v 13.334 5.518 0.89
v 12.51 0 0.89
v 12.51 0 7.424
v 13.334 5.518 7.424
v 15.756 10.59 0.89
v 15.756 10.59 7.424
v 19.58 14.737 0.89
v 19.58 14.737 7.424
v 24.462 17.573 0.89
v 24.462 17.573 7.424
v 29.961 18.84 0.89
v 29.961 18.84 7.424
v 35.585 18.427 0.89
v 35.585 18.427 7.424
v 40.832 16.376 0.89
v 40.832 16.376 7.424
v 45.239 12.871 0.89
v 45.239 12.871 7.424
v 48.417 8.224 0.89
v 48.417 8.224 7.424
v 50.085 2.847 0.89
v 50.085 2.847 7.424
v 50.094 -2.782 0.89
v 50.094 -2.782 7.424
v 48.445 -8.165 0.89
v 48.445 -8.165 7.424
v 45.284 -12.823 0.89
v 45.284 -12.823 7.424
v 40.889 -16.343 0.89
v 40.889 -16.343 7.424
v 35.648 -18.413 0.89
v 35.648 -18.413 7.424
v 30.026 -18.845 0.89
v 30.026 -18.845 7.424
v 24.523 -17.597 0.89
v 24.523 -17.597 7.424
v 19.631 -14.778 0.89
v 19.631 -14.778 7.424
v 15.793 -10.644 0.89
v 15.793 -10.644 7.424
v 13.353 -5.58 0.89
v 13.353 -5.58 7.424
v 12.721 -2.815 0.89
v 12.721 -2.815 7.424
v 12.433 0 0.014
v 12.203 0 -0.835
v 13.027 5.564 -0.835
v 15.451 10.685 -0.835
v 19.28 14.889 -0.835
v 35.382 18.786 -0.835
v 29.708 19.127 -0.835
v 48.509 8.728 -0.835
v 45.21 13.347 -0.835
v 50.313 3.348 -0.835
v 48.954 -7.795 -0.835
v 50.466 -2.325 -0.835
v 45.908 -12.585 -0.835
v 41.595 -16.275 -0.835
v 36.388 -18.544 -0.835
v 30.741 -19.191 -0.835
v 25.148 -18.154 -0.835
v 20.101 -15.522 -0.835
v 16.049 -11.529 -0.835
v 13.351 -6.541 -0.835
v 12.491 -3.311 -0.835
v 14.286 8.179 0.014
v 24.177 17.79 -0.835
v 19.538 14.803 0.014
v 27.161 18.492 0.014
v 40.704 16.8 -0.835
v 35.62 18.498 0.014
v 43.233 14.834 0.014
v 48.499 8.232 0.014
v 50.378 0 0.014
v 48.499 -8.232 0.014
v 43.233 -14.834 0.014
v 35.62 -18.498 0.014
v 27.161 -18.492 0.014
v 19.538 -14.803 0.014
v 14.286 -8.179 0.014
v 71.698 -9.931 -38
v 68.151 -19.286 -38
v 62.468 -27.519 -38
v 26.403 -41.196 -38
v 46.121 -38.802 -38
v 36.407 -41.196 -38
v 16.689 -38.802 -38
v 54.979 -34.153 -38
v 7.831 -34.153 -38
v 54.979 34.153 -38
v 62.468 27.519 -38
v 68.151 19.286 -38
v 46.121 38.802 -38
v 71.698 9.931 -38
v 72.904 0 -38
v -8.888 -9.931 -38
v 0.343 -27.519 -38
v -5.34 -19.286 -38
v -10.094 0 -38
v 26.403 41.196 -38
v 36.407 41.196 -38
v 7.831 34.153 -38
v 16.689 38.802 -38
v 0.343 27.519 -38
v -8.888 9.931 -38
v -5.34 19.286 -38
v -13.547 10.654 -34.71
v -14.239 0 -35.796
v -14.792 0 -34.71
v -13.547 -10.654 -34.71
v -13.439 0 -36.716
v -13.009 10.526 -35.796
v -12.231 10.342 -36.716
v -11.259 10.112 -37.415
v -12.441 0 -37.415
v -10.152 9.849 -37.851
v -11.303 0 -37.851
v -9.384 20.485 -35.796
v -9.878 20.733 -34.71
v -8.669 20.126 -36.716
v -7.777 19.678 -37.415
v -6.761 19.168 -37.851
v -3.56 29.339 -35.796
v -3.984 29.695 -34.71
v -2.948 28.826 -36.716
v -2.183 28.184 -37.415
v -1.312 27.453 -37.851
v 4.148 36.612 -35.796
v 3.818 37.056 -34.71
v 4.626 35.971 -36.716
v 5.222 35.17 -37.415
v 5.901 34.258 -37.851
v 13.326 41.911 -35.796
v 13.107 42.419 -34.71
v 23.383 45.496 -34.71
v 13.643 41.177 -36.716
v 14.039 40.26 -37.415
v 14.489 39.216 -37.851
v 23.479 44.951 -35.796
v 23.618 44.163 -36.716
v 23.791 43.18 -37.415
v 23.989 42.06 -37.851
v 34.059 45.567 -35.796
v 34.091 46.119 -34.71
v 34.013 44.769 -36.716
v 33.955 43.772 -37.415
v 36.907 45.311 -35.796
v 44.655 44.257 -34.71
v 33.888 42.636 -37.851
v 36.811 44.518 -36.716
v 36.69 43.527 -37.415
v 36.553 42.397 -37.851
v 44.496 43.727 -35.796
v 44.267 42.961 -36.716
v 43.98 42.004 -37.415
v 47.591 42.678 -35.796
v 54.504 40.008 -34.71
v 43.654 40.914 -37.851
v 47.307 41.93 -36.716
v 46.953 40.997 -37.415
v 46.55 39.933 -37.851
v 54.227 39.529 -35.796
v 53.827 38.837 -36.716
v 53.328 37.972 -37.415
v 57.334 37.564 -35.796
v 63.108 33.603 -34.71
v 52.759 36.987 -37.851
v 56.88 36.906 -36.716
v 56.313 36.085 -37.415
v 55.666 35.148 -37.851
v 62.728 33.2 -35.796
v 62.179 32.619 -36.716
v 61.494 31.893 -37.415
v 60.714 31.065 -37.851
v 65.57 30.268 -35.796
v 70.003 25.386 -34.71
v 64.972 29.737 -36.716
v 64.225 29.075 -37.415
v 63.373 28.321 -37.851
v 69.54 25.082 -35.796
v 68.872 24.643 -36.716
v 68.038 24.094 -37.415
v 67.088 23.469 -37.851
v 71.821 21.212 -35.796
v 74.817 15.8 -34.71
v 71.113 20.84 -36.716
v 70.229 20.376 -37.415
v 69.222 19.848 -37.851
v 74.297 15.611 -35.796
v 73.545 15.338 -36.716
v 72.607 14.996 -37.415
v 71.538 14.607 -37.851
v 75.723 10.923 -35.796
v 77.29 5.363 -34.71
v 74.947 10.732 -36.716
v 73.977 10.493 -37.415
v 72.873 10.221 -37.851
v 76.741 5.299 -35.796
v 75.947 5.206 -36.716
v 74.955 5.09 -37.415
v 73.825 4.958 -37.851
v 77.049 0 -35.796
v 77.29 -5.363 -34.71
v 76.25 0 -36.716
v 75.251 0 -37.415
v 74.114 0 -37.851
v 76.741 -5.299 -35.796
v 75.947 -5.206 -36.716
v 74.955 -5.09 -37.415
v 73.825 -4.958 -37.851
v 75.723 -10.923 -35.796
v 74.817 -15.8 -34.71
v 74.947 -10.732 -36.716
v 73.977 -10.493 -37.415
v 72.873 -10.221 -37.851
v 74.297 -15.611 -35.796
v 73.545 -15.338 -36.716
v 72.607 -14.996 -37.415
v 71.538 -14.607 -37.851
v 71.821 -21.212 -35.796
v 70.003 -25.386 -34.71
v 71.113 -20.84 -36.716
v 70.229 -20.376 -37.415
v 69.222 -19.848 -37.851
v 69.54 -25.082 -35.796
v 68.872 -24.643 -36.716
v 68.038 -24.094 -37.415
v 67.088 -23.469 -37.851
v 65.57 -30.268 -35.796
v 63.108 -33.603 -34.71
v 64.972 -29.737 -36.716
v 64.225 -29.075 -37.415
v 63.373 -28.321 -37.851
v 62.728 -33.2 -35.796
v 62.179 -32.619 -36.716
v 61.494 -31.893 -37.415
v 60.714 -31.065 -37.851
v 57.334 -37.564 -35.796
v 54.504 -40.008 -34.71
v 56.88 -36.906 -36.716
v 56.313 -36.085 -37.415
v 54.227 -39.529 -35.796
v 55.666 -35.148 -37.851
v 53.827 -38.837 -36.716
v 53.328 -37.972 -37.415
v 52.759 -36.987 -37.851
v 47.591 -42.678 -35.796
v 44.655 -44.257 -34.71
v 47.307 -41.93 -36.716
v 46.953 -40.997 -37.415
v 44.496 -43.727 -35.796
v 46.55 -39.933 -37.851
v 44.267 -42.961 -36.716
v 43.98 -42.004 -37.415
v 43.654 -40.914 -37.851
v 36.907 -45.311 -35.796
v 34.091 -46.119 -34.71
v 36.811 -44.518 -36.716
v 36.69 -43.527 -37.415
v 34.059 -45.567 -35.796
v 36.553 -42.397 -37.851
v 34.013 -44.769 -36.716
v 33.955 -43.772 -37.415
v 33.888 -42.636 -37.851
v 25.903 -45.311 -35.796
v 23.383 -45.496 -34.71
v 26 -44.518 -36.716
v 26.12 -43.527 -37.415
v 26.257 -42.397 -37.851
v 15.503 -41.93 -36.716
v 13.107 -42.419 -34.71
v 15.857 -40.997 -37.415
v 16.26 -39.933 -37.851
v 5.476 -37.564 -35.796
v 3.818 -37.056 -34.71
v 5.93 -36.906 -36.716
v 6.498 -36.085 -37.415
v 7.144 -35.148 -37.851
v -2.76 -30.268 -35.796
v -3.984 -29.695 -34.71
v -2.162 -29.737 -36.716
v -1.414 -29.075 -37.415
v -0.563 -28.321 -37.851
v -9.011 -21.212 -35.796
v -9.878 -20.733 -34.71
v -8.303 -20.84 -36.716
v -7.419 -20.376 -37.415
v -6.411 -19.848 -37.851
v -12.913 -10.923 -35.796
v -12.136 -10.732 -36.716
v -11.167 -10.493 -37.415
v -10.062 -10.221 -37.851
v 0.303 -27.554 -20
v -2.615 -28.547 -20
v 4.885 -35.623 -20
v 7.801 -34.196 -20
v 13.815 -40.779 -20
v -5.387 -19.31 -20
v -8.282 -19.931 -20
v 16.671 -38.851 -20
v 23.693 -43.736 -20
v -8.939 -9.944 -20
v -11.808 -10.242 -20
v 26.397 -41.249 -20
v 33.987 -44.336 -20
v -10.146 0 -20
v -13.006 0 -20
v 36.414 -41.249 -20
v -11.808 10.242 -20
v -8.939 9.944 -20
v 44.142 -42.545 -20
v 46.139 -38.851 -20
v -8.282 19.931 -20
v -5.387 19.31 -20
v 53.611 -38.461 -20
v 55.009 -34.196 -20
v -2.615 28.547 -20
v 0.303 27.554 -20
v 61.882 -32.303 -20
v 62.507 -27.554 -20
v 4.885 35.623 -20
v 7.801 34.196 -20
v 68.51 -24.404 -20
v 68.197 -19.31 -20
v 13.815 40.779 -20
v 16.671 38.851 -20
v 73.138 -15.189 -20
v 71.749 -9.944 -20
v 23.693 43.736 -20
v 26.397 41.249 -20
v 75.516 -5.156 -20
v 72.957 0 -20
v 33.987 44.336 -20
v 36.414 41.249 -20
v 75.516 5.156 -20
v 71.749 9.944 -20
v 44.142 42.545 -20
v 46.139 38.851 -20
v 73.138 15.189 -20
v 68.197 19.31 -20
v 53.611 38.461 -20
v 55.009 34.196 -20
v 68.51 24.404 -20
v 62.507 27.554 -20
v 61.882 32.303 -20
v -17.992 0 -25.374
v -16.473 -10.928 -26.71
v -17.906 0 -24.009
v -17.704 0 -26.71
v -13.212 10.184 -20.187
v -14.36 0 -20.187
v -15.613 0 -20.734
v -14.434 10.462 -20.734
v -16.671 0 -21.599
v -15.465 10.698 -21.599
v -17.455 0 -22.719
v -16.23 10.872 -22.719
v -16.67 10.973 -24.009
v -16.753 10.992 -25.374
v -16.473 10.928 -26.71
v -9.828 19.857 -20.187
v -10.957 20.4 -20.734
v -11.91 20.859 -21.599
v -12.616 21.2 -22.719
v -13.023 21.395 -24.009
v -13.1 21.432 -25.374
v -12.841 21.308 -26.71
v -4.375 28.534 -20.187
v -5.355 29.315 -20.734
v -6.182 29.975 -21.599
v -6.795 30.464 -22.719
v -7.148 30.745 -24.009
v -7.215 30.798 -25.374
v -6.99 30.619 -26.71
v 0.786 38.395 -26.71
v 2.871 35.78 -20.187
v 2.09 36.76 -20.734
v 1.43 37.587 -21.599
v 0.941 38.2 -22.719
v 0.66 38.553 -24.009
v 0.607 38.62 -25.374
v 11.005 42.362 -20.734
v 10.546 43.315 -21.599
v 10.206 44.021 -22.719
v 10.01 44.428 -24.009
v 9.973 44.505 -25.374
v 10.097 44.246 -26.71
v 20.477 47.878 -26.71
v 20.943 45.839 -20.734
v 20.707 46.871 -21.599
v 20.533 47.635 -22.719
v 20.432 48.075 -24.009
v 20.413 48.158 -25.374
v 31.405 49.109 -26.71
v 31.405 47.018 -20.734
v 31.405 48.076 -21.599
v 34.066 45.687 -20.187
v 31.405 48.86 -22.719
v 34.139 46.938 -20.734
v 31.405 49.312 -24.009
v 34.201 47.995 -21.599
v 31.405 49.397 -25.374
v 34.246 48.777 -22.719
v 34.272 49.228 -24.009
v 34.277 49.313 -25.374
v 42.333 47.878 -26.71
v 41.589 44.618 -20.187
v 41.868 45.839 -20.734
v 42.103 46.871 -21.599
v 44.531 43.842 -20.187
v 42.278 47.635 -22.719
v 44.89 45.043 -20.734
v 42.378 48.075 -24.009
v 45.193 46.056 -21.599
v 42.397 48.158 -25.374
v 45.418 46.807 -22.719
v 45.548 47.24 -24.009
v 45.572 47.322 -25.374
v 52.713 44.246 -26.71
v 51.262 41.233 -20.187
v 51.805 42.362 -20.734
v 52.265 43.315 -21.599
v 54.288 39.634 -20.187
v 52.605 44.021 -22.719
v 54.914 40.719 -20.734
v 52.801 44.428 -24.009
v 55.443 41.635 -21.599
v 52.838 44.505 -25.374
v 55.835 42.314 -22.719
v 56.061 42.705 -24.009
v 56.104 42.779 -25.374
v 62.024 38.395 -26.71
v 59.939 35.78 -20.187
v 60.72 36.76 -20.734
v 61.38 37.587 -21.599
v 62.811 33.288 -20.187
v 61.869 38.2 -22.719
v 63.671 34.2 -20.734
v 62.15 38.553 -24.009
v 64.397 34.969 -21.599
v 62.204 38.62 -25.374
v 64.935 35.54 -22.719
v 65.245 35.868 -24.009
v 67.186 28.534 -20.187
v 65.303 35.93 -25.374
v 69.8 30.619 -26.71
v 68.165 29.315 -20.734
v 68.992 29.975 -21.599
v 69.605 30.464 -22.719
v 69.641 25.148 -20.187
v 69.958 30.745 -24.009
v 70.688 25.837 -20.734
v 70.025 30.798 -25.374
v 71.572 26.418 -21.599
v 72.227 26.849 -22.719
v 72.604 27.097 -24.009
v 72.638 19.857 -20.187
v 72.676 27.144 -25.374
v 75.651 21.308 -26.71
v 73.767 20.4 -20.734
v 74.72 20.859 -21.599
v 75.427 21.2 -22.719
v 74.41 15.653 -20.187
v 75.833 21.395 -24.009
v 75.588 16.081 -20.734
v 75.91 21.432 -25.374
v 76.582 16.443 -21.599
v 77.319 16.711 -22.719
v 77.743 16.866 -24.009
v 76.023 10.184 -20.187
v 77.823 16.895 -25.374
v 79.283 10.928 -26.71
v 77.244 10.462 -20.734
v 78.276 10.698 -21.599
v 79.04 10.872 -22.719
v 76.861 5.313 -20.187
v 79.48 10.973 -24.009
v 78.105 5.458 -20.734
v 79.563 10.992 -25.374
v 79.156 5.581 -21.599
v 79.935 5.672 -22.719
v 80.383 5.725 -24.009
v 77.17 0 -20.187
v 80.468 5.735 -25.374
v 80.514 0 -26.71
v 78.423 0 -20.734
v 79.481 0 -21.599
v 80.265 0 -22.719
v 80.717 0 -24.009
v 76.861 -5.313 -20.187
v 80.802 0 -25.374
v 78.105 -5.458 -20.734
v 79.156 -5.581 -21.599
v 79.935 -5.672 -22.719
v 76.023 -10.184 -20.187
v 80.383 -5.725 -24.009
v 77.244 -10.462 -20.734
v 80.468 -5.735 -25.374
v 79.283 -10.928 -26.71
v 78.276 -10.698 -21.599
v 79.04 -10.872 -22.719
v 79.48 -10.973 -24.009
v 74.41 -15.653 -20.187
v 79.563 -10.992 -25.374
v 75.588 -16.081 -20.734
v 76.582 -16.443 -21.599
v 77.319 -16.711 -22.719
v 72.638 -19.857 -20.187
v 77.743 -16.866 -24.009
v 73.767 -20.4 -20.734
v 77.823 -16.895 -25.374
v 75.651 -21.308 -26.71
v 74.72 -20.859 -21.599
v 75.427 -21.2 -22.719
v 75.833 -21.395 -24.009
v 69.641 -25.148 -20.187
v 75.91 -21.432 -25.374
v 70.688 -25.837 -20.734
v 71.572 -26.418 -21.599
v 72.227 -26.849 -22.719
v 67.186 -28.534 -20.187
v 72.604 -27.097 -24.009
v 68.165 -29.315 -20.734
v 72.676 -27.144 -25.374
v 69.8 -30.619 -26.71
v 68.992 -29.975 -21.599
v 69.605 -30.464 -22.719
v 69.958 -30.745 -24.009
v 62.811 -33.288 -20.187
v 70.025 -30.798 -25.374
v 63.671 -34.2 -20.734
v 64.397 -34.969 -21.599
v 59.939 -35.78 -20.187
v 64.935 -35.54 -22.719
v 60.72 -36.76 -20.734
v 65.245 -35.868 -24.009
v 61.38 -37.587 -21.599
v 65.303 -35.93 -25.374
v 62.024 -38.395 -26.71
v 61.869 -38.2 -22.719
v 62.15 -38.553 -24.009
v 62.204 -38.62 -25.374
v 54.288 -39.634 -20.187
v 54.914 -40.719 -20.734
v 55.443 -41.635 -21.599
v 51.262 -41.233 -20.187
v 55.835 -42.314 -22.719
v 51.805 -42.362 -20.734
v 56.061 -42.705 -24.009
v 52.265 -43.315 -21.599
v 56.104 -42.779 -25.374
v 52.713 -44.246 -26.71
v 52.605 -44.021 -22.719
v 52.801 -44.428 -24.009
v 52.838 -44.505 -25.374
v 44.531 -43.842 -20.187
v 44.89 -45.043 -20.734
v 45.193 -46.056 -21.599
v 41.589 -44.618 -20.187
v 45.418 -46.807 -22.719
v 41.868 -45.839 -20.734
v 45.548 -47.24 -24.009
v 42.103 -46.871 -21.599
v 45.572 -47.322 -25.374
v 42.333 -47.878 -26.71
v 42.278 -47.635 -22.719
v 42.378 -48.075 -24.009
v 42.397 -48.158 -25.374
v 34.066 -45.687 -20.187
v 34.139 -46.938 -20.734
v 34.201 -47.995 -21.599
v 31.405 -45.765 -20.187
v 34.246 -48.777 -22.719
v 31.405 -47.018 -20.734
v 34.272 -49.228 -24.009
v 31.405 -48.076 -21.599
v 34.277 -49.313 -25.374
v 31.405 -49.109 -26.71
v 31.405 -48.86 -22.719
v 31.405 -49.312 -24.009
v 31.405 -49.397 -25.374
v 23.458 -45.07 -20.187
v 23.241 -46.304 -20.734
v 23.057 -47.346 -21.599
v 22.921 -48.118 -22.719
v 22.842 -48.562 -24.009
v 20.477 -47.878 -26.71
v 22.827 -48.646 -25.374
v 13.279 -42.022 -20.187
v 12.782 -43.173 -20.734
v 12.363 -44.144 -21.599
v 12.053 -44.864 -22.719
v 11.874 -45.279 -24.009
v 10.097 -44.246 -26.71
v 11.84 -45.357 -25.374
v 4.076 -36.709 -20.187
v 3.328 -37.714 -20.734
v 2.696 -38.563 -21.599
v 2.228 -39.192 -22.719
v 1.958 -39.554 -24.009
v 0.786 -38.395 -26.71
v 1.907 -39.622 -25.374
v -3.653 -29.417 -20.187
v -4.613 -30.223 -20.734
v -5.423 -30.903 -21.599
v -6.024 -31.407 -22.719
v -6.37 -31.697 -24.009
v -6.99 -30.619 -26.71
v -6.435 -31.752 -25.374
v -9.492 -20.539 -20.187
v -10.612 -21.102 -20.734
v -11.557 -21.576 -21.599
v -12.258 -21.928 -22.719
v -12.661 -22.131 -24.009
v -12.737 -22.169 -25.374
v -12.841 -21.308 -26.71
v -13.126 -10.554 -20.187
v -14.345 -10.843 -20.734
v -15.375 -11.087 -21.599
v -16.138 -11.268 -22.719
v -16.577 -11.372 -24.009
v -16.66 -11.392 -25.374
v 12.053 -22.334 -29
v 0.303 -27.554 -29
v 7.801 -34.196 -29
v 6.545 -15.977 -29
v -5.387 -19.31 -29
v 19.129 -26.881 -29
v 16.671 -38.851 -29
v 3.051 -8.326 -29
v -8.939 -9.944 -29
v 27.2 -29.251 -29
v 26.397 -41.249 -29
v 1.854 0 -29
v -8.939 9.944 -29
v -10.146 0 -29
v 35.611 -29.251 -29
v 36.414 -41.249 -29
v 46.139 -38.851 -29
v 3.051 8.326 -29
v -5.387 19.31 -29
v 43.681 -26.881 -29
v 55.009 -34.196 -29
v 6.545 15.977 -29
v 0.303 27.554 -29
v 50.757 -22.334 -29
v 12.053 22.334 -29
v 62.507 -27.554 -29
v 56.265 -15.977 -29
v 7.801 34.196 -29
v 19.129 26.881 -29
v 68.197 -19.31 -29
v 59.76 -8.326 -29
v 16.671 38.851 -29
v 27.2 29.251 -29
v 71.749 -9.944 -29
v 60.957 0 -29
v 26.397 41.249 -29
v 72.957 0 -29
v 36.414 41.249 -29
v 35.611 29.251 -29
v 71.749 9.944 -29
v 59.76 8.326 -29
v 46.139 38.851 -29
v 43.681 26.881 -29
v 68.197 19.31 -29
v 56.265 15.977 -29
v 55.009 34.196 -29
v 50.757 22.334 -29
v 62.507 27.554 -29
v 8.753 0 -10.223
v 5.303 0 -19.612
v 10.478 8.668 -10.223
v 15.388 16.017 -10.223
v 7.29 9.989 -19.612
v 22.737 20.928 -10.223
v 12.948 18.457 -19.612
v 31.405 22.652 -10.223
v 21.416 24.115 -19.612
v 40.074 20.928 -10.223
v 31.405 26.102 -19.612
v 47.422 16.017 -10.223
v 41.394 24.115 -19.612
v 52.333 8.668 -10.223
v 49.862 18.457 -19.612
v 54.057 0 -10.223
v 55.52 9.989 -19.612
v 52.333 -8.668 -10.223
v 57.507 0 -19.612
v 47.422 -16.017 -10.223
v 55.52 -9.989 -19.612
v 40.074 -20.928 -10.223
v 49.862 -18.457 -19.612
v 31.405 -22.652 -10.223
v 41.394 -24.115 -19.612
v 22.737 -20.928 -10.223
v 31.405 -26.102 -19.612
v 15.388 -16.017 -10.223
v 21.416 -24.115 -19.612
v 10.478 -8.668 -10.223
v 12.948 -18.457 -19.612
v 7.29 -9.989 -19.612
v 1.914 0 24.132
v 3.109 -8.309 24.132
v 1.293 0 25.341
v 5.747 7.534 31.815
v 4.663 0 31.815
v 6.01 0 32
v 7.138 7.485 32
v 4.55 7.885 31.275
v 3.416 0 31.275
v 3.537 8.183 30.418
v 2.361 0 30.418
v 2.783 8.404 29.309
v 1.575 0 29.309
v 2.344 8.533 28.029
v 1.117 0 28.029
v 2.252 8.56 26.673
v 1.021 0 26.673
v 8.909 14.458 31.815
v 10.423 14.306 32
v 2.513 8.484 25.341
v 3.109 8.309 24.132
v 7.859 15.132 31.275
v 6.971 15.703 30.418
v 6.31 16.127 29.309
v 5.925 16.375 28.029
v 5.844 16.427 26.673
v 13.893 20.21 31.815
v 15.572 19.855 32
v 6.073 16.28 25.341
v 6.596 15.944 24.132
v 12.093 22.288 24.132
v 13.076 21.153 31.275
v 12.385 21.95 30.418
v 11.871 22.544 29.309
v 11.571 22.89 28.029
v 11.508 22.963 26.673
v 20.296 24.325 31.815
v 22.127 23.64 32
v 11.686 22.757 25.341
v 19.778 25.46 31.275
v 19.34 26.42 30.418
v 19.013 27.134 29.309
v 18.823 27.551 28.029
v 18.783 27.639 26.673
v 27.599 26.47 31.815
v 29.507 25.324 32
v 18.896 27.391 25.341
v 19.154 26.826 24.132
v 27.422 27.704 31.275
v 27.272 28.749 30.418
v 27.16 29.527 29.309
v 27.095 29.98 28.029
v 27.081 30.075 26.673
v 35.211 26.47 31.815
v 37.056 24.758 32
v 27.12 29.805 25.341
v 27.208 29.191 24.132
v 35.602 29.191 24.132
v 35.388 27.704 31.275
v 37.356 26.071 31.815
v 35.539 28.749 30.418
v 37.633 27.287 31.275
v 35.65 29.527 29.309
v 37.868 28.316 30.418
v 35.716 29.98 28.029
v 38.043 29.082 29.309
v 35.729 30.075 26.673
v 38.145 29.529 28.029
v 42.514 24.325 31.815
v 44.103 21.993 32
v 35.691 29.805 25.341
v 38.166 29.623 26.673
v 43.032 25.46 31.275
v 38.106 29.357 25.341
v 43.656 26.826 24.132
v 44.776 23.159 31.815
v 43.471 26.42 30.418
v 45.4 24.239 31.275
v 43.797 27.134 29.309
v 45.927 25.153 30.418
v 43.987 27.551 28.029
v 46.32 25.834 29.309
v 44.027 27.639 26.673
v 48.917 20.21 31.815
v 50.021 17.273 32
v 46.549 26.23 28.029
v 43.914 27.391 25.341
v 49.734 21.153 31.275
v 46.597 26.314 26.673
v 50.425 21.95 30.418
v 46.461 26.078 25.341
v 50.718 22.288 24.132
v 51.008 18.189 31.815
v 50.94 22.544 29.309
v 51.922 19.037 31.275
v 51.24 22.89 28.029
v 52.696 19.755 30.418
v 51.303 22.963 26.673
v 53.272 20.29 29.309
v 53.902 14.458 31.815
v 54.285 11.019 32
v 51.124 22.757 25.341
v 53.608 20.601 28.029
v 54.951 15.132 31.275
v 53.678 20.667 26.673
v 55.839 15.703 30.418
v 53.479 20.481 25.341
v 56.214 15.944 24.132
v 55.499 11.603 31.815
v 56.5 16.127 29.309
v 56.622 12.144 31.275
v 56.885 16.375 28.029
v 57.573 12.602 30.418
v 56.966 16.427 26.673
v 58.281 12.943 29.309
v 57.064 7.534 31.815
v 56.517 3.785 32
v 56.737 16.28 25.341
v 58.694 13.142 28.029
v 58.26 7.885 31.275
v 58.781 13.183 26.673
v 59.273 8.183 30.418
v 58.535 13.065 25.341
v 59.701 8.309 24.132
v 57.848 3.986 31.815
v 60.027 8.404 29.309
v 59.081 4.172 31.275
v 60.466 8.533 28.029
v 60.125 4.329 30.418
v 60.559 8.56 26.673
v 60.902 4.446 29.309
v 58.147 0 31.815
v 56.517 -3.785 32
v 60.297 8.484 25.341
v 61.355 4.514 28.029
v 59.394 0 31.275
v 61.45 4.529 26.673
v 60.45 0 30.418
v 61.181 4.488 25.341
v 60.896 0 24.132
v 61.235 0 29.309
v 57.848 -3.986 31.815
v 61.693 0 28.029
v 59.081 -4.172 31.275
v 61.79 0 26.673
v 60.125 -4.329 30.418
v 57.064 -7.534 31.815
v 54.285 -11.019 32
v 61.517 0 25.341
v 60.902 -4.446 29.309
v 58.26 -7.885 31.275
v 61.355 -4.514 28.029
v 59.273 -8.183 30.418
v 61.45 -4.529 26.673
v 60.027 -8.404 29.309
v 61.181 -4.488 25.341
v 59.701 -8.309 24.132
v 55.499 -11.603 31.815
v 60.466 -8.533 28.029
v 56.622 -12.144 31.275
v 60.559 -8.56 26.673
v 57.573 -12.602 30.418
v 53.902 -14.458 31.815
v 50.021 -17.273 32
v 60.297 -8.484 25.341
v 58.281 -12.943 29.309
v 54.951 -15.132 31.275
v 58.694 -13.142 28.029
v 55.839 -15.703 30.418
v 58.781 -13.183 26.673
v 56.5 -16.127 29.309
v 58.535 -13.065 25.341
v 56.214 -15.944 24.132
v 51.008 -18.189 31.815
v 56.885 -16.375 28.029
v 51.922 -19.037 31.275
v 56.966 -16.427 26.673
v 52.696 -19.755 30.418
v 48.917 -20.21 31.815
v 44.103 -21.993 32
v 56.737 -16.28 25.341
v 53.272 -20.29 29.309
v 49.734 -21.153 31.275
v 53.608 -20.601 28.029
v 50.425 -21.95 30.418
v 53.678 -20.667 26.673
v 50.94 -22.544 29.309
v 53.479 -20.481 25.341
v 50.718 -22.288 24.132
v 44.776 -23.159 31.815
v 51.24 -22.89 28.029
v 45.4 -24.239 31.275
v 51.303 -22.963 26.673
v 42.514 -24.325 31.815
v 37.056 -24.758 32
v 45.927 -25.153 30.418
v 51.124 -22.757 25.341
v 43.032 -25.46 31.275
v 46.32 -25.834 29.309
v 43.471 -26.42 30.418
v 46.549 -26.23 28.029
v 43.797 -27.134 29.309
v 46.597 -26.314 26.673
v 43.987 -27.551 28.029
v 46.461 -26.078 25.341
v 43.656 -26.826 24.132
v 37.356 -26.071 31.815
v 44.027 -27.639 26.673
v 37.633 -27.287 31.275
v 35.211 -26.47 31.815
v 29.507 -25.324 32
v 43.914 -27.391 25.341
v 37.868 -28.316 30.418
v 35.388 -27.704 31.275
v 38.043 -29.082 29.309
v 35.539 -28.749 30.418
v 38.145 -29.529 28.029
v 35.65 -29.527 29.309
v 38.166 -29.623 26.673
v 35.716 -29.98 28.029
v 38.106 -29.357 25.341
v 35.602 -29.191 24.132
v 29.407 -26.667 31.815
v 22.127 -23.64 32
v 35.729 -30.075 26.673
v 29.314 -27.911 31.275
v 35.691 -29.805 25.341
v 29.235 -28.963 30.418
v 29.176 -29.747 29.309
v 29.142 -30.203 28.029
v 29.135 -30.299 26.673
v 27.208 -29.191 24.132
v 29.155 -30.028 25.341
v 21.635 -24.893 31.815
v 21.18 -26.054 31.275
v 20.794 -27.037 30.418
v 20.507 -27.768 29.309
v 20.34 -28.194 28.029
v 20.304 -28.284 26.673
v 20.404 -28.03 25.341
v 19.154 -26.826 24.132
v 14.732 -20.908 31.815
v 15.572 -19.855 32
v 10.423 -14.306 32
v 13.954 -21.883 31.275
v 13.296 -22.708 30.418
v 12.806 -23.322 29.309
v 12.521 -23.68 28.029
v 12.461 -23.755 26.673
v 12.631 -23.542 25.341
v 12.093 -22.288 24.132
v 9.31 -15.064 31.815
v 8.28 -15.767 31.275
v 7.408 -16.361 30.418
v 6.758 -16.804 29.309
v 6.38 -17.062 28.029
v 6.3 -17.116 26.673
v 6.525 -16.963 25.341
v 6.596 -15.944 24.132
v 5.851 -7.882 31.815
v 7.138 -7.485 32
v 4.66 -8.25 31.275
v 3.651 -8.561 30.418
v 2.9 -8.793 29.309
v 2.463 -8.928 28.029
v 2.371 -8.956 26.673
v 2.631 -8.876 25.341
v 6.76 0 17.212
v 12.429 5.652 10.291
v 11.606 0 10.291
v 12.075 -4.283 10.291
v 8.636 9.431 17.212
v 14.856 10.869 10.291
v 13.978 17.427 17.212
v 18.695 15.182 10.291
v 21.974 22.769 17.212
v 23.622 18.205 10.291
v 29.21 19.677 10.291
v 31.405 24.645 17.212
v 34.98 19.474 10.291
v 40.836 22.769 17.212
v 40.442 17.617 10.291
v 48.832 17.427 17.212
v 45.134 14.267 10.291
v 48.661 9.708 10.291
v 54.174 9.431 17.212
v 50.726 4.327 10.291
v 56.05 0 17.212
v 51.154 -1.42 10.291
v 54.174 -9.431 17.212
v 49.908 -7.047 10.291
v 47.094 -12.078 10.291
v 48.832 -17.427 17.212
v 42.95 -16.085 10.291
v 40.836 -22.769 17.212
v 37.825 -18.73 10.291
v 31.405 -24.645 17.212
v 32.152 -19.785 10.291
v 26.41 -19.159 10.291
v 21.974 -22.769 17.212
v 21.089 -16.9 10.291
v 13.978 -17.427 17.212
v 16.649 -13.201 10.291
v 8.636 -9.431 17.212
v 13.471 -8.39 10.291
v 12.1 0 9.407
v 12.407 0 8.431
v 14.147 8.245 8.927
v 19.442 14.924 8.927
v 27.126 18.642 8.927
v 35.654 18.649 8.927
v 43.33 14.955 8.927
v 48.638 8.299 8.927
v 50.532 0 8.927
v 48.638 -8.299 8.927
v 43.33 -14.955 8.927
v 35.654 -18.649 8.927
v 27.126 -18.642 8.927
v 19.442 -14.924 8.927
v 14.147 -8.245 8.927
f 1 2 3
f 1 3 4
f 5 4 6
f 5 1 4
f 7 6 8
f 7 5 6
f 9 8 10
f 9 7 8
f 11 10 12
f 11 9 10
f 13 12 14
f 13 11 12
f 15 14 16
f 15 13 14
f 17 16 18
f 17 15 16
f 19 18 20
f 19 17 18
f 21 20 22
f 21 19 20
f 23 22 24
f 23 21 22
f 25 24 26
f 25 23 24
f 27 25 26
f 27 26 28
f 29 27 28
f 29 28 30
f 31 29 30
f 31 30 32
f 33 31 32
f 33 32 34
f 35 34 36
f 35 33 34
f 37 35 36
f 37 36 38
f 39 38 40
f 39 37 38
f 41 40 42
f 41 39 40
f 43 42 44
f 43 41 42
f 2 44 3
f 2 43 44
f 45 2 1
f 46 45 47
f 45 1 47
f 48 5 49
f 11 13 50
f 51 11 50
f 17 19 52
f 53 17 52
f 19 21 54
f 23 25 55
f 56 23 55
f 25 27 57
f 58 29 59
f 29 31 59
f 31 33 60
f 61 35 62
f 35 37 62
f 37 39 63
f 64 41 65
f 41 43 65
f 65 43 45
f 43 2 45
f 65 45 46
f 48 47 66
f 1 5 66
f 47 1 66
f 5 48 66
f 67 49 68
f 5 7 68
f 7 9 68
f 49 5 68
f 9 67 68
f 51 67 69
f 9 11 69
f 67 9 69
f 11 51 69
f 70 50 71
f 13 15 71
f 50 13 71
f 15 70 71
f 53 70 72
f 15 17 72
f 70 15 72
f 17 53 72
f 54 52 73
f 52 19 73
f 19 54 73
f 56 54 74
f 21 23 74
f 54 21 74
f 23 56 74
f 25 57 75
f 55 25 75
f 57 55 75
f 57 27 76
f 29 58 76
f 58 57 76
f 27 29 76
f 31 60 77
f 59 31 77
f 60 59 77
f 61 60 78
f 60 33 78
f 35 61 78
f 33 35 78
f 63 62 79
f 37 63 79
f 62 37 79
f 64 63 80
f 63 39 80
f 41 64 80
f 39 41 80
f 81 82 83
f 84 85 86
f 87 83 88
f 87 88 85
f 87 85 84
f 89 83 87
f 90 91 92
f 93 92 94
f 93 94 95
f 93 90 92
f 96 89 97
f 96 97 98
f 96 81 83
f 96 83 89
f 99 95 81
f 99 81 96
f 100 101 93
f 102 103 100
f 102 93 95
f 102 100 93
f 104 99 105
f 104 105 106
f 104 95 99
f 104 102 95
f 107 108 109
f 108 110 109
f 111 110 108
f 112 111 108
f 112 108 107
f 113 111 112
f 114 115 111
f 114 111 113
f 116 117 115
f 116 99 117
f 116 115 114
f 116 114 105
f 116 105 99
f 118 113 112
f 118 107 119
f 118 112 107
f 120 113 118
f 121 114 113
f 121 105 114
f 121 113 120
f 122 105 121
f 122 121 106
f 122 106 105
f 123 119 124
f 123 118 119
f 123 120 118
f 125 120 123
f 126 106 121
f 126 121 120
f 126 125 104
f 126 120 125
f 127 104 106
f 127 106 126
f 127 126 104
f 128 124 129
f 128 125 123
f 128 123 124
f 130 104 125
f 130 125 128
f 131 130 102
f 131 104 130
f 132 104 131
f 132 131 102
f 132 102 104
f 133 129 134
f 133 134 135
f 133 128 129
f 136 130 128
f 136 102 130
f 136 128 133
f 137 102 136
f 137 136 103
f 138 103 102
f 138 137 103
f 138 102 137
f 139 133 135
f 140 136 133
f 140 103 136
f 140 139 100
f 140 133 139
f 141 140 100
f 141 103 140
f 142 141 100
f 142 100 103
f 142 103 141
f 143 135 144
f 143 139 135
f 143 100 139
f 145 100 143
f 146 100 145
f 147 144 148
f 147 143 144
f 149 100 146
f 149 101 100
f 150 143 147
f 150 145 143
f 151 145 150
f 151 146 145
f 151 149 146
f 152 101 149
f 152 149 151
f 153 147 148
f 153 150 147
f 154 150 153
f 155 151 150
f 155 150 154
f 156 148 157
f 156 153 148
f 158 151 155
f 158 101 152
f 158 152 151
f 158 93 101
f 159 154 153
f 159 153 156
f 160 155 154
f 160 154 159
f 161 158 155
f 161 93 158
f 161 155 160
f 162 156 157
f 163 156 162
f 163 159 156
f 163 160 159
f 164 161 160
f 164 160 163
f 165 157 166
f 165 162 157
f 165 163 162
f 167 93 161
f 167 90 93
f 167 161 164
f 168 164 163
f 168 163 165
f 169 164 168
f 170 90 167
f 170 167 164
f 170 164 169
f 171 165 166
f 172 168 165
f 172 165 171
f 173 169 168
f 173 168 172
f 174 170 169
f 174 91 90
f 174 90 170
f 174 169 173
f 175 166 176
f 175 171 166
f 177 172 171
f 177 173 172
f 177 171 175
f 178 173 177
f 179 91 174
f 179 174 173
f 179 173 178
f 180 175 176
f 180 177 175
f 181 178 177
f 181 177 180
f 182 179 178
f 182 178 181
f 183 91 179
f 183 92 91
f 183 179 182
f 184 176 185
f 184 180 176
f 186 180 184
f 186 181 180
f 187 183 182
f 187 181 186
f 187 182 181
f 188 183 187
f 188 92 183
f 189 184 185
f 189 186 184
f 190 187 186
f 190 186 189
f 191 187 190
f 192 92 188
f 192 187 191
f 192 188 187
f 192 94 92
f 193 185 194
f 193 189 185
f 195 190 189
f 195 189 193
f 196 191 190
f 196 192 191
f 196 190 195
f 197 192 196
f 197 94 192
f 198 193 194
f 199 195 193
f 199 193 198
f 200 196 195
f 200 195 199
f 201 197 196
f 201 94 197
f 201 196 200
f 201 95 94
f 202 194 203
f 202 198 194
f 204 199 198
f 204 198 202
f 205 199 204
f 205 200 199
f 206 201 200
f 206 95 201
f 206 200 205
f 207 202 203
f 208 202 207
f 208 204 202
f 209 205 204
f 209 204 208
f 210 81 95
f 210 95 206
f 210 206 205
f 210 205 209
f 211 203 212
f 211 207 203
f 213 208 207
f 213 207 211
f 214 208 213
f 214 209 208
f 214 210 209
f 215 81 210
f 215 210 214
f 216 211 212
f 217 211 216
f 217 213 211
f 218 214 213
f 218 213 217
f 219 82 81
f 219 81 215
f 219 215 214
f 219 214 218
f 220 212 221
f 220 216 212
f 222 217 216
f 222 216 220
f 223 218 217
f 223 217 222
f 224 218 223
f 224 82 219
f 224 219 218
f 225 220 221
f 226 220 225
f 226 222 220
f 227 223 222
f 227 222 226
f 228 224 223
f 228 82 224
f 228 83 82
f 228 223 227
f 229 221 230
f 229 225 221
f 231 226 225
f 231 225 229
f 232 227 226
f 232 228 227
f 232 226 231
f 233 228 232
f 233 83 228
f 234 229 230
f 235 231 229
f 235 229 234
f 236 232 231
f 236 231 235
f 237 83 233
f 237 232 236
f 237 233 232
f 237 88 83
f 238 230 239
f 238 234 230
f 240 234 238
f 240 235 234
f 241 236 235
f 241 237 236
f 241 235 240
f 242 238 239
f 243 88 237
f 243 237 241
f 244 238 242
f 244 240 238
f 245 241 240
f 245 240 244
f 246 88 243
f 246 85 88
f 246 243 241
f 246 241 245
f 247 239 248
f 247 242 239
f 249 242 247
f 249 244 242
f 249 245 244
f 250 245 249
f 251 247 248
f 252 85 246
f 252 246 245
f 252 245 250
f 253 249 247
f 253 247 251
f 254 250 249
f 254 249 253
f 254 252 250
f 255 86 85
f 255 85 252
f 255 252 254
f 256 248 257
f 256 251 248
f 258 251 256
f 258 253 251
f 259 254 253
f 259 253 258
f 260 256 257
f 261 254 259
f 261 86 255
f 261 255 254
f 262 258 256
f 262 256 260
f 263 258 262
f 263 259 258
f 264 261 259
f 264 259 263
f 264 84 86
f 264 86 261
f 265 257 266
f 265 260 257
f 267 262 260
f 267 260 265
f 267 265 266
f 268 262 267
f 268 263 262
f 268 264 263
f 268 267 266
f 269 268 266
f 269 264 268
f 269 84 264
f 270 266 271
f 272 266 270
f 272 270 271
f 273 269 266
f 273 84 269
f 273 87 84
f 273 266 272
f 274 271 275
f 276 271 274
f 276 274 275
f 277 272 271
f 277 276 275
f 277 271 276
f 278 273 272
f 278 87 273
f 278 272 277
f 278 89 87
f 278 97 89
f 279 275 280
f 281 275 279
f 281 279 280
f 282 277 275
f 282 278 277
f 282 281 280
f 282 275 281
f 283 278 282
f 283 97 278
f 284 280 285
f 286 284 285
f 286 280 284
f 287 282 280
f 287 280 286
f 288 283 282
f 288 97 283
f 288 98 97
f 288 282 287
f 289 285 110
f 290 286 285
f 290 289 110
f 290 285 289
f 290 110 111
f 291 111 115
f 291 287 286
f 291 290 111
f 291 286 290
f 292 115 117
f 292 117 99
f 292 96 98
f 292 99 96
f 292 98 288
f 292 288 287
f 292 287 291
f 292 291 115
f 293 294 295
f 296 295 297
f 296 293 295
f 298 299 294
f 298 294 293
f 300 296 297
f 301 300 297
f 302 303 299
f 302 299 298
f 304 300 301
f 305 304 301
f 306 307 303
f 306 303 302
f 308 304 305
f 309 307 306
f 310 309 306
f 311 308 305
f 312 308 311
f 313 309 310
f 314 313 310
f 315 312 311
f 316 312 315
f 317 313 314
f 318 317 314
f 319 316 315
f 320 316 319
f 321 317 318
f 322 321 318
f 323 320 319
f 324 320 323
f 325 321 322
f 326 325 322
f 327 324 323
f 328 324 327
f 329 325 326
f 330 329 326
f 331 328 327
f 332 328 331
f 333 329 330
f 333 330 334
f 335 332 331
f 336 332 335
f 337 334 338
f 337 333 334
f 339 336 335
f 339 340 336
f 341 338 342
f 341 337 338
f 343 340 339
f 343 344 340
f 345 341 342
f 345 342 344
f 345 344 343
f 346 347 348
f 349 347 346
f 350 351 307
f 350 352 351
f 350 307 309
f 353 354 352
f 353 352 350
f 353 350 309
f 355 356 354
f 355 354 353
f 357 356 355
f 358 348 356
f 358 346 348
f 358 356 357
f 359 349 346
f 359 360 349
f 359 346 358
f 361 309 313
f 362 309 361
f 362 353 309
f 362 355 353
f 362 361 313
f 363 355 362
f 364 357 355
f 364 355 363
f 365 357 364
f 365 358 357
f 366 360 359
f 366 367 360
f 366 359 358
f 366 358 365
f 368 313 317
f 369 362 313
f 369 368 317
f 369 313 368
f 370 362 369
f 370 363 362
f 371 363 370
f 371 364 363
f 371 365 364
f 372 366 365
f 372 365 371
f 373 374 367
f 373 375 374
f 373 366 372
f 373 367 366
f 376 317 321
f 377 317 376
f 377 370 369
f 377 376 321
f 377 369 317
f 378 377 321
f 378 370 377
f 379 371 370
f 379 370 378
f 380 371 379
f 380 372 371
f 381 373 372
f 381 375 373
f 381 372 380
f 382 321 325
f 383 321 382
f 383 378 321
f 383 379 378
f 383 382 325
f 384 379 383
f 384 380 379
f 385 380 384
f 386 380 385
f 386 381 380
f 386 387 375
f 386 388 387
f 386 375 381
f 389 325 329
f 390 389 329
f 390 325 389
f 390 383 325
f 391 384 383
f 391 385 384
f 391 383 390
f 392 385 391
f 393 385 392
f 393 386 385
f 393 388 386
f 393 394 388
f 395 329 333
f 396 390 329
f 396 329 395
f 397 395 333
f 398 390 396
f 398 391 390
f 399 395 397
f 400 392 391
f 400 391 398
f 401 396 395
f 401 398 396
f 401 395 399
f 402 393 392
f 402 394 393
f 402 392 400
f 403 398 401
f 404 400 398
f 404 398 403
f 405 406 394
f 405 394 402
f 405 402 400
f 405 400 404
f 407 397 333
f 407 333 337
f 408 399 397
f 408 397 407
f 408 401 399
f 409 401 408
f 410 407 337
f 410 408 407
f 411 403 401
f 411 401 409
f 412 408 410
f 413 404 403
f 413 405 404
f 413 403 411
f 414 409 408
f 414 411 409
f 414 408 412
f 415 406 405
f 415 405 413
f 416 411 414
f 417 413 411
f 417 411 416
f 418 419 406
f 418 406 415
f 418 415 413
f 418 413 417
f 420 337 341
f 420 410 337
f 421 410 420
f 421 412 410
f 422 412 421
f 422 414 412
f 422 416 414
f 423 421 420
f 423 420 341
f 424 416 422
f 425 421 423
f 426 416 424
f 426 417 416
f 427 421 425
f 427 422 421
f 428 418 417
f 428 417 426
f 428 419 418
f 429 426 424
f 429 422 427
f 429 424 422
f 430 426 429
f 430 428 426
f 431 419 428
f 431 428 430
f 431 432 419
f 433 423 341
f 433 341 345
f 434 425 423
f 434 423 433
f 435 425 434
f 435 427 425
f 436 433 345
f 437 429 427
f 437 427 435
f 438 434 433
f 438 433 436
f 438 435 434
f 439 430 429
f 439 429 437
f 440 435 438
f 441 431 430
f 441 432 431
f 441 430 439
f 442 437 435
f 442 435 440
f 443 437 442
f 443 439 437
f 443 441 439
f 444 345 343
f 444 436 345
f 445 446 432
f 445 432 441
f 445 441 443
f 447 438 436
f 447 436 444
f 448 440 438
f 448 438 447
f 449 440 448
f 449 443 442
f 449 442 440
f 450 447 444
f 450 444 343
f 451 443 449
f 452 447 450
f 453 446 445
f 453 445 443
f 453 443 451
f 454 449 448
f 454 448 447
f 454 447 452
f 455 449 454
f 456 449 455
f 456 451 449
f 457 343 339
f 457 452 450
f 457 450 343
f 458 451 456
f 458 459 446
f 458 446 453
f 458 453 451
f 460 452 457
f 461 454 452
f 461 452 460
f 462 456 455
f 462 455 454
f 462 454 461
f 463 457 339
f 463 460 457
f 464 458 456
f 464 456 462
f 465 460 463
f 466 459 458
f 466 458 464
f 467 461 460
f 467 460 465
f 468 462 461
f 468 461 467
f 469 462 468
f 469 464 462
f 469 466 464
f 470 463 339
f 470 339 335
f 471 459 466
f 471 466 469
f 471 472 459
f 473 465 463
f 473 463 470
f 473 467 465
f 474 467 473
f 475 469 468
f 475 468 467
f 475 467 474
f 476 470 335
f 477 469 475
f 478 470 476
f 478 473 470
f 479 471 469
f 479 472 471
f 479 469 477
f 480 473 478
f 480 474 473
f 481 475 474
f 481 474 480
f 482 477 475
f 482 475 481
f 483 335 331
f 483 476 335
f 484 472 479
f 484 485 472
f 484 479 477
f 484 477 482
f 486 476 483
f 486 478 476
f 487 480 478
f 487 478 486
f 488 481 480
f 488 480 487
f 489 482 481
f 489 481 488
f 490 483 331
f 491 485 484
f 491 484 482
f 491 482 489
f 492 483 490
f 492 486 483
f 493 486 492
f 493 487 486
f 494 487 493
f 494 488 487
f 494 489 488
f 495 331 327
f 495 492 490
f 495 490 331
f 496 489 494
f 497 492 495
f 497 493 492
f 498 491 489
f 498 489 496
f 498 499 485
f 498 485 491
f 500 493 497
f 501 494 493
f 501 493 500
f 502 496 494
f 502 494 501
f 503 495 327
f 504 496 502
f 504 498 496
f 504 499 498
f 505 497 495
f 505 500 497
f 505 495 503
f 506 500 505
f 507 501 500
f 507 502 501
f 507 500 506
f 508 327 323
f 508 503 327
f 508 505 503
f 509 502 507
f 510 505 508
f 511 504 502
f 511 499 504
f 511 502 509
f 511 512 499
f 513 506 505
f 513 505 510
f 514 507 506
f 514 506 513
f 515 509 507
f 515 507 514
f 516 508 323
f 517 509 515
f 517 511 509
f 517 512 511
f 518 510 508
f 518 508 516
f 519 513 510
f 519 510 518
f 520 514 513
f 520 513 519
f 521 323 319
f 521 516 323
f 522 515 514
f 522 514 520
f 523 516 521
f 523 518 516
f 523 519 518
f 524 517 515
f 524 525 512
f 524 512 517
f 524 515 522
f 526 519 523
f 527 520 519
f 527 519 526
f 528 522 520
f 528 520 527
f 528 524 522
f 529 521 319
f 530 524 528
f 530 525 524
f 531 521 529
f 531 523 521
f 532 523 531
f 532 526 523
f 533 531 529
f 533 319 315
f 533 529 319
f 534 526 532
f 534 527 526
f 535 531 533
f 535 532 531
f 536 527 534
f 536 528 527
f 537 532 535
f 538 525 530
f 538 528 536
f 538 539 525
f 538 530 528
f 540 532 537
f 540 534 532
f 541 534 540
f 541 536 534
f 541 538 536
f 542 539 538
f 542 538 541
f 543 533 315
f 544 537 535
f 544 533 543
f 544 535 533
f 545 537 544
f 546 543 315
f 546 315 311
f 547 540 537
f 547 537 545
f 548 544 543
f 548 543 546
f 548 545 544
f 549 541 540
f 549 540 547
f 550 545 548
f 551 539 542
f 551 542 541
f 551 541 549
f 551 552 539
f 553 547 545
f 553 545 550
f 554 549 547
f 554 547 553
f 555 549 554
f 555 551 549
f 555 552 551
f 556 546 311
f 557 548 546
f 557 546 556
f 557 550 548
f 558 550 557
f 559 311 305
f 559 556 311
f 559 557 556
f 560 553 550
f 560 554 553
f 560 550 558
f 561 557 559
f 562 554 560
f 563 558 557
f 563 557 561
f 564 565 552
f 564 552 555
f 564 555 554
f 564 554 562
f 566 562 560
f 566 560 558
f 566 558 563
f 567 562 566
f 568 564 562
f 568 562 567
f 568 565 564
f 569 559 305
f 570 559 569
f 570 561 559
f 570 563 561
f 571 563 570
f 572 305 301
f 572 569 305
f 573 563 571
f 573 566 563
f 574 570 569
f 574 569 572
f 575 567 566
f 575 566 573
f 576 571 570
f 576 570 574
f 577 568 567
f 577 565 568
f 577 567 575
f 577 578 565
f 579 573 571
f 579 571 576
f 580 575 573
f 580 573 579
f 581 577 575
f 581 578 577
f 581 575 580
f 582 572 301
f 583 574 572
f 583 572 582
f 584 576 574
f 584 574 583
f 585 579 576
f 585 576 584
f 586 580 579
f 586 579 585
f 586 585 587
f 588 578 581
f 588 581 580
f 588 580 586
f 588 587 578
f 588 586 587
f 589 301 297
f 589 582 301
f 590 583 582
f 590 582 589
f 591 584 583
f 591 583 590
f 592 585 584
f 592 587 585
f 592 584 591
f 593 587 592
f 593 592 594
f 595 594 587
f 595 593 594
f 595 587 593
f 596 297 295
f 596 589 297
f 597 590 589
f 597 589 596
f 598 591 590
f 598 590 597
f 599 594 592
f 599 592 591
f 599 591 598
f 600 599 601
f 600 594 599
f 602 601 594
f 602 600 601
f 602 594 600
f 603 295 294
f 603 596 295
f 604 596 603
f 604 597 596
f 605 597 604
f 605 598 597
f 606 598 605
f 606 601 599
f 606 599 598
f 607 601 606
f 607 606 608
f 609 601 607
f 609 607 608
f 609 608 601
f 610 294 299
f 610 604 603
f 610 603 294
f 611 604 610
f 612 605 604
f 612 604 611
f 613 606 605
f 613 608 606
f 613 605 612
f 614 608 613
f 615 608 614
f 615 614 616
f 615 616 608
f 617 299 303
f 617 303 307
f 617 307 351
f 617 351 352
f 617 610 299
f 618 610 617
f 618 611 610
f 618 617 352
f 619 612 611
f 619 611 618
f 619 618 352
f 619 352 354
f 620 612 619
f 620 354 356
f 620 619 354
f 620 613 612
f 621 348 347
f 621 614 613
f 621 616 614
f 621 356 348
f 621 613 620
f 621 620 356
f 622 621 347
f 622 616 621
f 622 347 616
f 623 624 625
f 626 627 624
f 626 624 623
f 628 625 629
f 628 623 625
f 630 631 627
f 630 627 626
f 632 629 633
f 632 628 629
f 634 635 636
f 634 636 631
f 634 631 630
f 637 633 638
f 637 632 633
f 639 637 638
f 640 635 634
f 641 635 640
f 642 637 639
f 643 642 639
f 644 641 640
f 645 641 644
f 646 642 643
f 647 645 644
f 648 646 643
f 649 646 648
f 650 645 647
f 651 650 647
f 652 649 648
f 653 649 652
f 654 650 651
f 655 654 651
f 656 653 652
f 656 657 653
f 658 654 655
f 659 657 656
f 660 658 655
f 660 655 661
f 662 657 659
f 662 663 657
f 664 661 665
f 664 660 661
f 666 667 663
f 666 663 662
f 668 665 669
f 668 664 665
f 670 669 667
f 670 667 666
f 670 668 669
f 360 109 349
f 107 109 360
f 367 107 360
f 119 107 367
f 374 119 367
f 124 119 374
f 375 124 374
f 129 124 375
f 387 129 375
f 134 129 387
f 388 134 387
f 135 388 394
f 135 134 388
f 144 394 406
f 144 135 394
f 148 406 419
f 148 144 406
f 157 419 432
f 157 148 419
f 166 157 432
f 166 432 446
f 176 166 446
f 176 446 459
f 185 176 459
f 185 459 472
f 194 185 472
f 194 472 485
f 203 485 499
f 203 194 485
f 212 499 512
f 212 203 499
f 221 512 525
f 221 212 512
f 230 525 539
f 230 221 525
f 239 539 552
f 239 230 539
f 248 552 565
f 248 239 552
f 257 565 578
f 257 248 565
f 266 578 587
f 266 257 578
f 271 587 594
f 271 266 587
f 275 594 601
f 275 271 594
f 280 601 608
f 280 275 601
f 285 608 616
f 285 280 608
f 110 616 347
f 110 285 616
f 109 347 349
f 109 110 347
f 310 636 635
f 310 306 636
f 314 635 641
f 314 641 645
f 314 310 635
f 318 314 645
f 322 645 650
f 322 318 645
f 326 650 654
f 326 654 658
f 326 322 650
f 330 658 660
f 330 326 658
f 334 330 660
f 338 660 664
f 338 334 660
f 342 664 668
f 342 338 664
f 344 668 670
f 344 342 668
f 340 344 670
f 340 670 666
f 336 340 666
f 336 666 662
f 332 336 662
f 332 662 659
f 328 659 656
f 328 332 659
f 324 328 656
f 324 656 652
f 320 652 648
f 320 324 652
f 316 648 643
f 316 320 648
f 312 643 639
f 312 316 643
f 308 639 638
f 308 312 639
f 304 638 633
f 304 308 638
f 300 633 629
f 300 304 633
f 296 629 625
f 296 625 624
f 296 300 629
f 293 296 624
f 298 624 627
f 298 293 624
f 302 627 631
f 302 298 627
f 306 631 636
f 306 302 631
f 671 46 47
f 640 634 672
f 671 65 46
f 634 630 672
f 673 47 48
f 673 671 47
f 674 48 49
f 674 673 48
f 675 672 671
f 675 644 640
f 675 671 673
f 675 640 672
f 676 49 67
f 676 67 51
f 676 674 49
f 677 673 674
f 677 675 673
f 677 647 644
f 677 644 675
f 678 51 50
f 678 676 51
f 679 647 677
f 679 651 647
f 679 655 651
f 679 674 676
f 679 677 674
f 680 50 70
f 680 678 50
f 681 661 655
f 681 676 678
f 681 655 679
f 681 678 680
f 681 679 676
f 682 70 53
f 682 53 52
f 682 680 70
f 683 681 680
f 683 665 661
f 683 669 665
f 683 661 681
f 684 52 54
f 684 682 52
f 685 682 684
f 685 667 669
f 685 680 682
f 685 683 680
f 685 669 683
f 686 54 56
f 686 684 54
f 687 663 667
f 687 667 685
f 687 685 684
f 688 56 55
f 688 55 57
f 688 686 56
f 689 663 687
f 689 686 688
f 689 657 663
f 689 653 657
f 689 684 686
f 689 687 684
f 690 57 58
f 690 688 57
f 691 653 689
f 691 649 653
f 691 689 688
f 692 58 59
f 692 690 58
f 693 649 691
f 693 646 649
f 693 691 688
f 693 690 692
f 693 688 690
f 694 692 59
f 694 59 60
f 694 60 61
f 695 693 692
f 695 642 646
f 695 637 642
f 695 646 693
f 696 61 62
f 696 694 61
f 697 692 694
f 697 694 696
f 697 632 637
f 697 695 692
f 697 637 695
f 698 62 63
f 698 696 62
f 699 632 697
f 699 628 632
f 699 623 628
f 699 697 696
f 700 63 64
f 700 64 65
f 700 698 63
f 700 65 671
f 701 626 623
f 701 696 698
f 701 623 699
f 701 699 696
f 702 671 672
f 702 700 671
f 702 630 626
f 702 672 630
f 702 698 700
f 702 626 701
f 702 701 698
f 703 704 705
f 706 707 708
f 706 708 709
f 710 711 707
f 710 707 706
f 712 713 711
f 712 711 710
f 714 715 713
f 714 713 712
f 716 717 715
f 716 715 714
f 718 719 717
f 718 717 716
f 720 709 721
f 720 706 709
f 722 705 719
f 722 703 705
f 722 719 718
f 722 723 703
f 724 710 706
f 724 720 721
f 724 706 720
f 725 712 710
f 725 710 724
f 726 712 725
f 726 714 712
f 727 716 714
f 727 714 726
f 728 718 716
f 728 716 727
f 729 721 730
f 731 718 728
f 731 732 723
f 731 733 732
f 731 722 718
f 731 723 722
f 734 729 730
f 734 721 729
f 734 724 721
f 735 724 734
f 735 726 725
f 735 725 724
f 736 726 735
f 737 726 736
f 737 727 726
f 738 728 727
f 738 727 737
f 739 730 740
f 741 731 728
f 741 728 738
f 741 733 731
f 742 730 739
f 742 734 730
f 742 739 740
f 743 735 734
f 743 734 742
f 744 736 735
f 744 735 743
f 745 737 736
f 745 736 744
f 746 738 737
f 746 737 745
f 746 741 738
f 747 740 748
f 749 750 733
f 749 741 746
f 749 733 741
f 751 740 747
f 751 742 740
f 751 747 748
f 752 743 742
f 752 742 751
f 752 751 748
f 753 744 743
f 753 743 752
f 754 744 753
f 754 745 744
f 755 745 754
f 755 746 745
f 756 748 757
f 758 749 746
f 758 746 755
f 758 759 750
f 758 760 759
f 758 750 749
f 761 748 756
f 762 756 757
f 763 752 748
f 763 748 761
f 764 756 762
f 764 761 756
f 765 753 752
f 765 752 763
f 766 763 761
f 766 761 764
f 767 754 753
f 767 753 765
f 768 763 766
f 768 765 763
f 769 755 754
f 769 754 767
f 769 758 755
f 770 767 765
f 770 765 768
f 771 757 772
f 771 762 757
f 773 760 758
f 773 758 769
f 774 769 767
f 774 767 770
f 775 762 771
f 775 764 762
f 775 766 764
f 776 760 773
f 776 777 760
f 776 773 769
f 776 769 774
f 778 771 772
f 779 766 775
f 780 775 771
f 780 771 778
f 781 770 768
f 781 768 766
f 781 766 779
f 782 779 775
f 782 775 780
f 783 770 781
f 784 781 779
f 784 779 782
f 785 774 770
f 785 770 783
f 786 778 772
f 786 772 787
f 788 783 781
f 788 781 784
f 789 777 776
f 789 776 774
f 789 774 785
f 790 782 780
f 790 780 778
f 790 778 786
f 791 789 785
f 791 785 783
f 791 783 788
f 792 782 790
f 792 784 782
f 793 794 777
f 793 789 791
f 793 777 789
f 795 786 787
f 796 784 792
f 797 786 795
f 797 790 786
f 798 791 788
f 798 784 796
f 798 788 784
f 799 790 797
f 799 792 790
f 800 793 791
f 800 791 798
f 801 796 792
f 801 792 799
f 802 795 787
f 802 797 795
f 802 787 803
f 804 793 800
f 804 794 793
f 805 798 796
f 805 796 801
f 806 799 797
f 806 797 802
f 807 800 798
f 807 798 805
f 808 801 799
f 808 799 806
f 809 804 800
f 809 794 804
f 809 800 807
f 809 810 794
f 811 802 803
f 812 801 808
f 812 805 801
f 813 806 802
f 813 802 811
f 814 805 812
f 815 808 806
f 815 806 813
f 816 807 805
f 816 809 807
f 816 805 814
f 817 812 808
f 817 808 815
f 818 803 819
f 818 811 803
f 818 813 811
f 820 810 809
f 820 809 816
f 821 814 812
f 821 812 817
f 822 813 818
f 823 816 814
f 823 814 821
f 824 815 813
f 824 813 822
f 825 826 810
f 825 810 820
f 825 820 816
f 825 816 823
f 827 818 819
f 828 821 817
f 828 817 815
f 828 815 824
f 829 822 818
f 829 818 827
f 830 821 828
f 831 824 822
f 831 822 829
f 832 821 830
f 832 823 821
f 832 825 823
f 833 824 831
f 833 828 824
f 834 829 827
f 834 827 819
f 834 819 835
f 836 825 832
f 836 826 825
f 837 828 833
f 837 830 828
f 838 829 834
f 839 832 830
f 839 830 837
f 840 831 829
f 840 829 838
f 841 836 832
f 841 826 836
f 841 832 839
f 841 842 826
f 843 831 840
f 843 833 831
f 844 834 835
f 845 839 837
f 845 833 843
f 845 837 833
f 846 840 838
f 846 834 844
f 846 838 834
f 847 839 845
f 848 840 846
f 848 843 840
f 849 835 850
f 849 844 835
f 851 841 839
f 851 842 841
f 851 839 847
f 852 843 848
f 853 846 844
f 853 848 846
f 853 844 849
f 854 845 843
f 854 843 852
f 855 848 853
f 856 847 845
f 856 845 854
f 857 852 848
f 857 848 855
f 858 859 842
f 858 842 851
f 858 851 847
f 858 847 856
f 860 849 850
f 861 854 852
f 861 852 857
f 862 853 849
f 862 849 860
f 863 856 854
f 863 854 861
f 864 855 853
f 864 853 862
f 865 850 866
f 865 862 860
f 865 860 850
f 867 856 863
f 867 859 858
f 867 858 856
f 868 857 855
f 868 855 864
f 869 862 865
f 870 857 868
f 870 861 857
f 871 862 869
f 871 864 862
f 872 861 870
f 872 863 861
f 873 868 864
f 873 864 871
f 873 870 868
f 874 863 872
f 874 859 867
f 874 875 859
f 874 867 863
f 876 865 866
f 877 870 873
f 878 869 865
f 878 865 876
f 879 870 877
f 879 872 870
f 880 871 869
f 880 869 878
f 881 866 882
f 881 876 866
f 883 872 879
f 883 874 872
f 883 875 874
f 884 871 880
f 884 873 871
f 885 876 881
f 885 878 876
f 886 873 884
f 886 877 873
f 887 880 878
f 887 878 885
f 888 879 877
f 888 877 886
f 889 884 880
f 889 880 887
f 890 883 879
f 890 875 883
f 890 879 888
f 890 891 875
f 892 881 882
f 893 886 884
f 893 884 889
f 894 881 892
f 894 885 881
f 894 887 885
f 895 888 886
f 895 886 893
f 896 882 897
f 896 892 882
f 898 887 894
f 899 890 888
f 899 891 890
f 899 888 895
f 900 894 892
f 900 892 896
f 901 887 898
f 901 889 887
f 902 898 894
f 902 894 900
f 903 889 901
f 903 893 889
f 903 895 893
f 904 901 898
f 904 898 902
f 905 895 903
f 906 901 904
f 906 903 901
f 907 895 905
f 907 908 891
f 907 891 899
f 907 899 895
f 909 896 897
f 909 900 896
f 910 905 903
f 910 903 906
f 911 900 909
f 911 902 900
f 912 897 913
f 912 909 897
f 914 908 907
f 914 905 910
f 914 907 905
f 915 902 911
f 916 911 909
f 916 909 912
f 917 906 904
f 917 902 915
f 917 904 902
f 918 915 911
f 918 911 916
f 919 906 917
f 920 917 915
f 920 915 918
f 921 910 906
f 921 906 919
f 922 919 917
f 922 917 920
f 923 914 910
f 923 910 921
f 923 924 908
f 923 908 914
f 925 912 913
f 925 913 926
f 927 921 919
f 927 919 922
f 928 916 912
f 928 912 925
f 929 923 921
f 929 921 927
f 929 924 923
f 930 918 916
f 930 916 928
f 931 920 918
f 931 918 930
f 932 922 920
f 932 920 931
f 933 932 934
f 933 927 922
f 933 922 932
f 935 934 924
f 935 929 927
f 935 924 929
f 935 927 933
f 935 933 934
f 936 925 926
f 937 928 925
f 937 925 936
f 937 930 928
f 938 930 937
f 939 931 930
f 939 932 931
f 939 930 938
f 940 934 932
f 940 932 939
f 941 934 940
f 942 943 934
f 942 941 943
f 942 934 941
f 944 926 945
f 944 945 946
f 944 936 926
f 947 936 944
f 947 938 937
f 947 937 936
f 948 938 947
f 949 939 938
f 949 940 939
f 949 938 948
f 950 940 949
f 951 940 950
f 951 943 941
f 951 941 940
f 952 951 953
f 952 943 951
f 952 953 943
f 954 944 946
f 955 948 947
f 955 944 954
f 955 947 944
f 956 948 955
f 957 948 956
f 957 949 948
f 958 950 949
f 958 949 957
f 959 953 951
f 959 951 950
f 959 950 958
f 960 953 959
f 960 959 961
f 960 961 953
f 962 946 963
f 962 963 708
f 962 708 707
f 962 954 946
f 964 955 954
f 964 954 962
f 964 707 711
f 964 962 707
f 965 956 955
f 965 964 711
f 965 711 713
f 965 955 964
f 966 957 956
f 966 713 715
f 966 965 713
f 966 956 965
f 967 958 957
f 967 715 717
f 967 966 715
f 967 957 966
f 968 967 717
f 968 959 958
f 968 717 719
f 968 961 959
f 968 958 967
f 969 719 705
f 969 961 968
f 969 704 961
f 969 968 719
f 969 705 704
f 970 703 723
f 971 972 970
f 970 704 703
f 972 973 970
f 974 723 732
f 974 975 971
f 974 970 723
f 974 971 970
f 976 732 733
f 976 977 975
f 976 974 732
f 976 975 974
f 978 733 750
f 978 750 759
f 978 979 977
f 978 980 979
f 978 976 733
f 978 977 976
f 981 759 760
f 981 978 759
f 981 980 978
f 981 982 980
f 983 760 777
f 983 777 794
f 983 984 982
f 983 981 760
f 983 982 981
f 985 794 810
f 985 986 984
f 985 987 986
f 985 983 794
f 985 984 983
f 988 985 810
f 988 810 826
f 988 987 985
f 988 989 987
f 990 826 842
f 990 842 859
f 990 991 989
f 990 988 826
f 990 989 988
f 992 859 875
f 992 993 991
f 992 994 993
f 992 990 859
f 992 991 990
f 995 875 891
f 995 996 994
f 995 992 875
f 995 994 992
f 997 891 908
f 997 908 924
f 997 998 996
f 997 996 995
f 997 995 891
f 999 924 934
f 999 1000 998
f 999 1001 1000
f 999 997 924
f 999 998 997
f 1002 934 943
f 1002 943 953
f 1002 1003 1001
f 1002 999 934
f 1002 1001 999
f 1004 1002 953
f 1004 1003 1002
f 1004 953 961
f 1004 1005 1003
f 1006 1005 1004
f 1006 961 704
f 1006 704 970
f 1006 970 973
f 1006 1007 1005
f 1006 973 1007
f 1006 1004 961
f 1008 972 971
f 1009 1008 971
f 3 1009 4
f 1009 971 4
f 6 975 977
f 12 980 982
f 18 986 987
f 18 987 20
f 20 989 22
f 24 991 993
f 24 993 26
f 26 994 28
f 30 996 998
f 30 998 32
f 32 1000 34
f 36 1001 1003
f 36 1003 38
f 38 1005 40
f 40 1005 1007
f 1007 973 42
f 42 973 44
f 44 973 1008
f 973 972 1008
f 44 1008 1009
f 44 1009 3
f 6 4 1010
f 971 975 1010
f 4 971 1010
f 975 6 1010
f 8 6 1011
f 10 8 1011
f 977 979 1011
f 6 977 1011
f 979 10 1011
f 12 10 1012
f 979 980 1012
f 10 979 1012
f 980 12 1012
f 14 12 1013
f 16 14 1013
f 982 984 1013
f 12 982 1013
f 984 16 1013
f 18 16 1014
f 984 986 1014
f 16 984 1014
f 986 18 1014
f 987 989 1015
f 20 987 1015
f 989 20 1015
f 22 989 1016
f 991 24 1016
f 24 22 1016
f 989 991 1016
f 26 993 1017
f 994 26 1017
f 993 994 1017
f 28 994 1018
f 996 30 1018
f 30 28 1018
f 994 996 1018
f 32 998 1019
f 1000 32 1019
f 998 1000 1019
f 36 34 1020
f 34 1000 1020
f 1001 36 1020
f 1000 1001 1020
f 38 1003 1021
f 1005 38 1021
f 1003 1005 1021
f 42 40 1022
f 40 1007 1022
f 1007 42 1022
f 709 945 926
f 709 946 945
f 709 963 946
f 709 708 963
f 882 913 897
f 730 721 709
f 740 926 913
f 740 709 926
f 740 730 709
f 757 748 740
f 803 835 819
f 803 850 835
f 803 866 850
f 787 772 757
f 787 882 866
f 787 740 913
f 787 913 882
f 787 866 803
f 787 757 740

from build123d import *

# Parameters (mm, degrees)
F2_R = 5
F3_R = 5
F4_R = 5


with BuildPart() as f1:
    # F0 (on Front) → F1 (revolve)
    with BuildSketch(Plane.XZ):
        Polygon((-13.5948596994, -38), (31.4051403006, -38), (31.4051403006, 32), (-3.5948596994, 32), (12.5099136795, 9), (12.5099136795, 0), (1.8536760838, -29), (-10.1463239162, -29), (-10.1463239162, -20), (-20.1463239162, -20), align=None)
    revolve(axis=Axis((31.4051403006, 0, -3), (0, 0, -1)))

    # F2
    f2_edges = [f1.edges().sort_by_distance(p)[0] for p in [
        (66.40514, 0, 32),
        (82.956605, 0, -20),
    ]]
    fillet(f2_edges, radius=F2_R)

    # F3
    f3_edges = [f1.edges().sort_by_distance(p)[0] for p in [
        (50.300367, 0, 0),
        (50.300367, 0, 9),
    ]]
    fillet(f3_edges, radius=F3_R)

    # F4
    f4_edges = [f1.edges().sort_by_distance(p)[0] for p in [
        (76.40514, 0, -38),
    ]]
    fillet(f4_edges, radius=F4_R)


solid = f1.part
